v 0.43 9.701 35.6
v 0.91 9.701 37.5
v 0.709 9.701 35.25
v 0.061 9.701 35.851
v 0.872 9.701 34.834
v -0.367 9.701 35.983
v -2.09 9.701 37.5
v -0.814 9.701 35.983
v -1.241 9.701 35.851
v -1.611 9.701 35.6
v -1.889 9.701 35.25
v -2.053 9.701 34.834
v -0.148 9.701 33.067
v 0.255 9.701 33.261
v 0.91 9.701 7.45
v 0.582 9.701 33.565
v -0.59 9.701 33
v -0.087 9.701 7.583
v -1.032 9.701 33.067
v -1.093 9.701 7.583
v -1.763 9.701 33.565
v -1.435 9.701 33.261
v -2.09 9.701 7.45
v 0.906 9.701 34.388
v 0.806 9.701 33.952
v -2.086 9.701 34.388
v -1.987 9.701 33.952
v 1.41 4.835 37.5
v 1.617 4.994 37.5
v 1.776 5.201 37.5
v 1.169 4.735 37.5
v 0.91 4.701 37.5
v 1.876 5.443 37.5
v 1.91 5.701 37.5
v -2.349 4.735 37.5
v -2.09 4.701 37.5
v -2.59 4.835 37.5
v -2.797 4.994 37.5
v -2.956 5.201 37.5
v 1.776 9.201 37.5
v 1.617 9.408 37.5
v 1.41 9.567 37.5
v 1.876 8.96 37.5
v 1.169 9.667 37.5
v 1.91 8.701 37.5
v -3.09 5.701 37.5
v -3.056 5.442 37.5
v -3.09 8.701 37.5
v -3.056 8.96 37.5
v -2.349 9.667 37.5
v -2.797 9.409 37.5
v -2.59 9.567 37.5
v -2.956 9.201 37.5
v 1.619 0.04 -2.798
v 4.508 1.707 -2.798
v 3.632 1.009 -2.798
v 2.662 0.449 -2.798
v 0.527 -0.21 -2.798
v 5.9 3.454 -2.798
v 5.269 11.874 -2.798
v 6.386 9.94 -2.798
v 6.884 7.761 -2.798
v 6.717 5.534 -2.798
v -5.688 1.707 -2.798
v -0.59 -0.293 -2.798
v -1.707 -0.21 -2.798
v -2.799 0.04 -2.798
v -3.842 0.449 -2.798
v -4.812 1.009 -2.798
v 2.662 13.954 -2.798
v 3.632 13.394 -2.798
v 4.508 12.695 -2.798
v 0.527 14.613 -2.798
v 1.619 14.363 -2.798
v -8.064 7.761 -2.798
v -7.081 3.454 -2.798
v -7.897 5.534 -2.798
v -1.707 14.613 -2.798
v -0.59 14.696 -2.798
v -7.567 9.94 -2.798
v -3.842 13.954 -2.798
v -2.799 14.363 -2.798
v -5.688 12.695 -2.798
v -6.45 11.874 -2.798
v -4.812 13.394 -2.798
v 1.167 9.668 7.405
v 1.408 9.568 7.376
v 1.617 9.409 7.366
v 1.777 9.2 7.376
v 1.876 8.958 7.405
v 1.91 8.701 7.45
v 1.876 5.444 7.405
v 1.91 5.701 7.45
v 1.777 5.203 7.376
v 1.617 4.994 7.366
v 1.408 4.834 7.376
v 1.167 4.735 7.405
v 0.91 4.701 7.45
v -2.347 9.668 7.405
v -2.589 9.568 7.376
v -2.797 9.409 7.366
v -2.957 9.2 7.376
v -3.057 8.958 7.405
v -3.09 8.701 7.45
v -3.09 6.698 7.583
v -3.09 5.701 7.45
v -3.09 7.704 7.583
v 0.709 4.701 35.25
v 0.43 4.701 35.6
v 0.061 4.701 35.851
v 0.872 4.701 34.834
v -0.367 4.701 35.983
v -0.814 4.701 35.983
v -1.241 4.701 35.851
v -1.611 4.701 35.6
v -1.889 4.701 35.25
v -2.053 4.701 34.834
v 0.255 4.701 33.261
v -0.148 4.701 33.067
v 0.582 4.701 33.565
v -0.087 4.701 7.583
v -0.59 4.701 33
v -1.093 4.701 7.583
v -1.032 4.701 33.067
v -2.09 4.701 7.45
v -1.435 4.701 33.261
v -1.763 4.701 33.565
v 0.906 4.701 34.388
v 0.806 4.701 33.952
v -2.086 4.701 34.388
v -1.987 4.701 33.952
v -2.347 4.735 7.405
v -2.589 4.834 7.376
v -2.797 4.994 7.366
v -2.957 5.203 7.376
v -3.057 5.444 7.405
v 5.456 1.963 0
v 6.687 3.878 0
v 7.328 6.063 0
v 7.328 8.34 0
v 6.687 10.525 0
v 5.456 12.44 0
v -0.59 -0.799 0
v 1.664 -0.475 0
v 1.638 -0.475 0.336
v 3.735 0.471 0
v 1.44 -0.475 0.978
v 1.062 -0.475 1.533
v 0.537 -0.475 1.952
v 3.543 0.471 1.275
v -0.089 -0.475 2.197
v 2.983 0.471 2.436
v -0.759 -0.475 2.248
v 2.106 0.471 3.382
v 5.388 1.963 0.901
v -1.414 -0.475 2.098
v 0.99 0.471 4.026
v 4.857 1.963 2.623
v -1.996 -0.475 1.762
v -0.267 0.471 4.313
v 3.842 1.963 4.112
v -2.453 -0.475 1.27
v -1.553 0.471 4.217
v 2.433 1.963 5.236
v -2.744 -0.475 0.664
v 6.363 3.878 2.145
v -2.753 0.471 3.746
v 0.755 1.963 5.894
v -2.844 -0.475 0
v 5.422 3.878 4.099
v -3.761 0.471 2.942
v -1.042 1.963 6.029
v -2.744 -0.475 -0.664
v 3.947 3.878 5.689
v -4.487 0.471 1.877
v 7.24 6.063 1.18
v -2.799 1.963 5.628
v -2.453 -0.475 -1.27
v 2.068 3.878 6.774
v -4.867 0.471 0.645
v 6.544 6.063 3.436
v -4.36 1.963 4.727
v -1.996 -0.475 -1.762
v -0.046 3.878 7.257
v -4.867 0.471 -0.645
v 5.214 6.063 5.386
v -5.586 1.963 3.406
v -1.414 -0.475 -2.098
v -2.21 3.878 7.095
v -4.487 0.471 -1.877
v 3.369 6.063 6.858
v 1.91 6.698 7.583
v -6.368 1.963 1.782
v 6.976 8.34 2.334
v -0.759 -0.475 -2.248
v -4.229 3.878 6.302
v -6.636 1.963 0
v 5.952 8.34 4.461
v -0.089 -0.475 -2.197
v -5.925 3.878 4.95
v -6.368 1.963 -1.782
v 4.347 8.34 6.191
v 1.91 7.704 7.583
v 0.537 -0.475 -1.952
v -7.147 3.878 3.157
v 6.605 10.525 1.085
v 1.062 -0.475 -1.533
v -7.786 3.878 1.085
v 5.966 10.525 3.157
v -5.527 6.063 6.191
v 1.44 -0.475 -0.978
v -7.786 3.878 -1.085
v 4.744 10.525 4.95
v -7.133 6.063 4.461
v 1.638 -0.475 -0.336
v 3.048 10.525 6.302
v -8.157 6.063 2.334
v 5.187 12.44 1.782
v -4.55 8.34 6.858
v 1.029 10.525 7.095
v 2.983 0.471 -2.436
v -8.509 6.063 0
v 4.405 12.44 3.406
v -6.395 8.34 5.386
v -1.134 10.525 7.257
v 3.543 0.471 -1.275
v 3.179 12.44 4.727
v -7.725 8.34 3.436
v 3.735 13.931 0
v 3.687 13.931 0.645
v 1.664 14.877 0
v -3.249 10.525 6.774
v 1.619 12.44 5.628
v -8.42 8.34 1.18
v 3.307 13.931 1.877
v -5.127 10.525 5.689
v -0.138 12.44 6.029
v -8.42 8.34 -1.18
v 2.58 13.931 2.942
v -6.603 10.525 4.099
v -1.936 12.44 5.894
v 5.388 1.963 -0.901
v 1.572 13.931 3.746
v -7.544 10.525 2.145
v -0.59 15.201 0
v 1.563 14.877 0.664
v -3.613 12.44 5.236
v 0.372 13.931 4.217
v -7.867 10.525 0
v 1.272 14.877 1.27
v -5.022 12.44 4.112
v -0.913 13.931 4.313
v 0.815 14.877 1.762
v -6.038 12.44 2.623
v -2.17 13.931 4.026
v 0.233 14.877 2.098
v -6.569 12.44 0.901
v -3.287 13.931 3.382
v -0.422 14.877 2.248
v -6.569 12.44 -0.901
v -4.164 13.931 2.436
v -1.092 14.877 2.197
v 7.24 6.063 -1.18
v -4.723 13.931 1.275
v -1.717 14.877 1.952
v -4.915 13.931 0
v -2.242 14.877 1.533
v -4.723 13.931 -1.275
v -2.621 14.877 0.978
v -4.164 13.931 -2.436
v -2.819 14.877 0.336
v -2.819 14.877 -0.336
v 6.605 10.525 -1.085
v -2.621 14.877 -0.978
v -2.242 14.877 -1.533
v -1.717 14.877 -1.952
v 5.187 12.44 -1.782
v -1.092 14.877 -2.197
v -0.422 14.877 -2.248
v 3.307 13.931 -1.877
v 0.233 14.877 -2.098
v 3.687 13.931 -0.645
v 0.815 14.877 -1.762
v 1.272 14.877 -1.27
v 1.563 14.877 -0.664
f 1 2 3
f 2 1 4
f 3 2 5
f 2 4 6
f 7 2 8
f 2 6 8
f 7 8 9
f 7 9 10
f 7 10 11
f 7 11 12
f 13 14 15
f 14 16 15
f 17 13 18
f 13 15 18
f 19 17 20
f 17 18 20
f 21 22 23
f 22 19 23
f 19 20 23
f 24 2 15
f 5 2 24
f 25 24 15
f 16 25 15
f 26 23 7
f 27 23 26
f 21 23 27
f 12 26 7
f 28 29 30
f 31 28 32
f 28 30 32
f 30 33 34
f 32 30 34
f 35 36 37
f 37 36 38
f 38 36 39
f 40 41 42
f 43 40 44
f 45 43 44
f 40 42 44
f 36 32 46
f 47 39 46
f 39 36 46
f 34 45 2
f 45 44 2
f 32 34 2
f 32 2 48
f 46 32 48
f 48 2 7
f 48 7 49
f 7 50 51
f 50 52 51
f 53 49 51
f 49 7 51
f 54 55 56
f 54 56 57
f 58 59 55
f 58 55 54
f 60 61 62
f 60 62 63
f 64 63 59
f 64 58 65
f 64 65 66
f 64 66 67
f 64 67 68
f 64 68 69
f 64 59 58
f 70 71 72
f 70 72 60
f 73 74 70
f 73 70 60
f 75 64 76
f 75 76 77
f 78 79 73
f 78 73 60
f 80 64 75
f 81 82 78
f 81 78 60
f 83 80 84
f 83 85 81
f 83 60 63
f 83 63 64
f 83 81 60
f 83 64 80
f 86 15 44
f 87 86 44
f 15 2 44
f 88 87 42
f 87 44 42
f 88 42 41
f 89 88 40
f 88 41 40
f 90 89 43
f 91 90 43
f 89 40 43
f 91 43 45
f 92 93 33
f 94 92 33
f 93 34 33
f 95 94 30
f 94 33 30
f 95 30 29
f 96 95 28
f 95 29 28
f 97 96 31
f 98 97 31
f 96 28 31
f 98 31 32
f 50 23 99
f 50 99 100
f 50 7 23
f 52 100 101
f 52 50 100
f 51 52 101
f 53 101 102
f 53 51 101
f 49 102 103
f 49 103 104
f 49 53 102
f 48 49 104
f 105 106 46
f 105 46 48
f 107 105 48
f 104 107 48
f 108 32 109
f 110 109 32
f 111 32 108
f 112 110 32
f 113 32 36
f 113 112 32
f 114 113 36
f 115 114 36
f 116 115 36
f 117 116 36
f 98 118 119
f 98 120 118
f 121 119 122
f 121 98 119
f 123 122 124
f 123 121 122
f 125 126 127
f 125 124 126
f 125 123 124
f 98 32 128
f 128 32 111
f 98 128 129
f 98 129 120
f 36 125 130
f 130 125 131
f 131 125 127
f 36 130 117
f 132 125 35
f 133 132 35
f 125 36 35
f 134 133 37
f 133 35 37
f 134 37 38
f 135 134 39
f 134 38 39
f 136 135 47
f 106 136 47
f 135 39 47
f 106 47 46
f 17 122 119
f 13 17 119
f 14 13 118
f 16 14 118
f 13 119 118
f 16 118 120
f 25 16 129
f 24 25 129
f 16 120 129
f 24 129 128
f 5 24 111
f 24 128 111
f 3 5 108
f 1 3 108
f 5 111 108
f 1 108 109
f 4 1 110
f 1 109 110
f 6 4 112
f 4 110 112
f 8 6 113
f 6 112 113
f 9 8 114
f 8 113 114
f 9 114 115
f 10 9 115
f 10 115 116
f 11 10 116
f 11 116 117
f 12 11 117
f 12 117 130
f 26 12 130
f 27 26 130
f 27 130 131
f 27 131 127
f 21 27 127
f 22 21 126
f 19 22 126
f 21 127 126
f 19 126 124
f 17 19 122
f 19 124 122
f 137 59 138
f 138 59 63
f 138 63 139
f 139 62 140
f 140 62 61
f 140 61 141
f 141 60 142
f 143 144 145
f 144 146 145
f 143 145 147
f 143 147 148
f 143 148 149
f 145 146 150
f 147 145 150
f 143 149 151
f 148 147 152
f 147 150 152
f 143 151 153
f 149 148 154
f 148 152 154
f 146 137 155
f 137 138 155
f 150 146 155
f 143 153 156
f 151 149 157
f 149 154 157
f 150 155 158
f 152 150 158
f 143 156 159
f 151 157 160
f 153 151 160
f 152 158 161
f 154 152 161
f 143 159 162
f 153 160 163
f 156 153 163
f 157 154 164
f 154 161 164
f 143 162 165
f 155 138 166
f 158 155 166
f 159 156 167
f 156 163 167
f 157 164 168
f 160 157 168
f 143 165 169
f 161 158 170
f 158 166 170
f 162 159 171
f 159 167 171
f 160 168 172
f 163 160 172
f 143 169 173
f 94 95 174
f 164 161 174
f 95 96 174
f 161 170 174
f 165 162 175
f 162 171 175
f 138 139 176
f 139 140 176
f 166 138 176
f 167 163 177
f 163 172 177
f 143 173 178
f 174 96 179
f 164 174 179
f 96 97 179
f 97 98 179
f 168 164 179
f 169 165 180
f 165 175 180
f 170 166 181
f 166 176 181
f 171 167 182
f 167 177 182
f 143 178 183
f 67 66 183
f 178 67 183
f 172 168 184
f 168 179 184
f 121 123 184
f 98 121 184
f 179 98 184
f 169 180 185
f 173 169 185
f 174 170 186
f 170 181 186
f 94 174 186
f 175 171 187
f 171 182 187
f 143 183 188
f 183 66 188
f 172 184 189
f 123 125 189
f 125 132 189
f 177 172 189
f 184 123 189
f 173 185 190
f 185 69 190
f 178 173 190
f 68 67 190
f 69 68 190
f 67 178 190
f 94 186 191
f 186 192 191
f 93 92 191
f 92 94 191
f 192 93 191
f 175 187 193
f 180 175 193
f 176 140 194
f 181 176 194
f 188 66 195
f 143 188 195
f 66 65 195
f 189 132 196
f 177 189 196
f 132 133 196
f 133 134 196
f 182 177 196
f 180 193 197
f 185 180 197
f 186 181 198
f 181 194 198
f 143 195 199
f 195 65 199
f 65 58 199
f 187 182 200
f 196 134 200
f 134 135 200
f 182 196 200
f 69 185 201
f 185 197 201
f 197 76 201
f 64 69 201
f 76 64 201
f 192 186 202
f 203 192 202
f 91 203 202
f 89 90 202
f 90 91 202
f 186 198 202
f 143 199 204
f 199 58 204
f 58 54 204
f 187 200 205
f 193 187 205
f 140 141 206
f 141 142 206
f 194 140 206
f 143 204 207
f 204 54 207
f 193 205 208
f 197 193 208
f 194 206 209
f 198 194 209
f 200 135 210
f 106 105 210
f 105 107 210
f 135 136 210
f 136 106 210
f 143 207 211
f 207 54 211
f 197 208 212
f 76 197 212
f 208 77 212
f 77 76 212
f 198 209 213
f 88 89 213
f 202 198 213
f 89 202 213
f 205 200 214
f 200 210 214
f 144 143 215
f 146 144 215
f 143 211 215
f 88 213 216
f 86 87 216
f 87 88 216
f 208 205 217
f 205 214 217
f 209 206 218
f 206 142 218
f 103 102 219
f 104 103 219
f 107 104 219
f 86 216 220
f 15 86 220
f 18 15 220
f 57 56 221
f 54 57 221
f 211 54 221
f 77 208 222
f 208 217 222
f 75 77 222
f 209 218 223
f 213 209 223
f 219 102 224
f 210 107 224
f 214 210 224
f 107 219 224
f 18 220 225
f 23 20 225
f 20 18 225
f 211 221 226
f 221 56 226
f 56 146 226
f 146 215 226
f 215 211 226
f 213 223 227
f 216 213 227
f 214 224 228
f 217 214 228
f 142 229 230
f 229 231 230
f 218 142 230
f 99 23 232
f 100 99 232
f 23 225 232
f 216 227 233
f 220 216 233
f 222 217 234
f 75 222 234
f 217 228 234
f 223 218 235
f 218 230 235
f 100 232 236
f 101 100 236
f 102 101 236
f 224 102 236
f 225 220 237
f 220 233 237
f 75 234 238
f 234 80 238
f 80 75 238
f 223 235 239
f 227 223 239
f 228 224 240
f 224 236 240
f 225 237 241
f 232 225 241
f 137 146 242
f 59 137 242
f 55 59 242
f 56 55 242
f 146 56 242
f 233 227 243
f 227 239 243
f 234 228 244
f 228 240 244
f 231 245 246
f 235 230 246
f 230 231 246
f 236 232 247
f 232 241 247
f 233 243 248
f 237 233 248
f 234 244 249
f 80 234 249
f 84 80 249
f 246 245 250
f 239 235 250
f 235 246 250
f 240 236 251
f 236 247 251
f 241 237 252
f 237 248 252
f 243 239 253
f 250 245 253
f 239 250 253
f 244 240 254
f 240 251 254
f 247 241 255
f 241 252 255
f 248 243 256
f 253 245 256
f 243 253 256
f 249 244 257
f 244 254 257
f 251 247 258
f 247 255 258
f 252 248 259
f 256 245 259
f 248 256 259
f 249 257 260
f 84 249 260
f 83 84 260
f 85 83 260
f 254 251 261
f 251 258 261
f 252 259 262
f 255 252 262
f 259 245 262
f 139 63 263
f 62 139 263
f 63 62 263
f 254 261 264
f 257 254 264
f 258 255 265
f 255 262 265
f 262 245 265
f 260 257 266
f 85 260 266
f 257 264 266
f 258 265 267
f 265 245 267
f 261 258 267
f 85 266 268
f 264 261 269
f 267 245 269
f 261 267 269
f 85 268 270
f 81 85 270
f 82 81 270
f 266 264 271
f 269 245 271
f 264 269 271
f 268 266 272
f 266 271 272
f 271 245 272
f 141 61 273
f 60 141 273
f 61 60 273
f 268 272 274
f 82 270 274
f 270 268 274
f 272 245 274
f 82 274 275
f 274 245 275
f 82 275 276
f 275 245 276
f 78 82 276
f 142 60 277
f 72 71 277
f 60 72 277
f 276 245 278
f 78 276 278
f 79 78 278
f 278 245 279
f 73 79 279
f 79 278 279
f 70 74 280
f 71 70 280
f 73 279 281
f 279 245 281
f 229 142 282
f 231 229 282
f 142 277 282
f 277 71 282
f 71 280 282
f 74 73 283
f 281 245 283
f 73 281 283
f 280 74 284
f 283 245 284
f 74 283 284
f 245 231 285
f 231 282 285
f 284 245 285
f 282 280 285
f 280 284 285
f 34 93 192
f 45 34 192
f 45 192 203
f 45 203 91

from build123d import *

# Parameters (mm, degrees)
SKETCH3_W           = 5
SKETCH3_H           = 5
BOSS_EXTRUDE1_DEPTH = 37.5
SKETCH4_R           = 1.5
CUT_EXTRUDE1_DEPTH  = 5
SKETCH5_W           = 3.469365962
SKETCH5_H           = 1.189282553
BOSS_EXTRUDE2_DEPTH = 8
SKETCH6_W           = 20.090906928
SKETCH6_H           = 16.444349254
CUT_EXTRUDE2_DEPTH  = 10.5
FILLET5_R           = 1
FILLET6_R           = 1
FILLET7_R           = 1
FILLET8_R           = 1


with BuildPart() as part:
    # Sketch1 → Revolve1 (revolve)
    with BuildSketch(Plane.XY):
        with BuildLine():
            Line((-0.590277778, 15.201388889), (-0.590277778, -0.798611111))
            ThreePointArc((-0.590277778, -0.798611111), (7.409722222, 7.201388889), (-0.590277778, 15.201388889))
        make_face()
    revolve(axis=Axis((-0.590277778, 15.201388889, 0), (0, -1, 0)))

    # Sketch3 → Boss-Extrude1 (add)
    with BuildSketch(Plane(origin=(0, 0, 0), x_dir=(-1, 0, 0), z_dir=(0, 0, -1))):
        with Locations((0.590277778, 7.201388889)):
            Rectangle(SKETCH3_W, SKETCH3_H)
    extrude(amount=-BOSS_EXTRUDE1_DEPTH)

    # Sketch4 → Cut-Extrude1 (cut)
    with BuildSketch(Plane.XZ.offset(-4.701388889)):
        with Locations(Location((-0.590277778, 34.5, 0), (0, 0, 270))):
            Circle(SKETCH4_R)
    extrude(amount=-CUT_EXTRUDE1_DEPTH, mode=Mode.SUBTRACT)


with BuildPart() as body_2:
    # Sketch5 → Boss-Extrude2 (new body)
    with BuildSketch(Plane(origin=(0, 0, 0), x_dir=(1, 0, 0), z_dir=(0, 1, 0))):
        with Locations((0, 12.70312089)):
            Rectangle(SKETCH5_W, SKETCH5_H)
    extrude(amount=BOSS_EXTRUDE2_DEPTH)


with BuildPart() as cut_extrude2_tool:
    # Sketch6 → Cut-Extrude2 (new body)
    with BuildSketch(Plane(origin=(0, 0, -13.297762167), x_dir=(-1, 0, 0), z_dir=(0, 0, -1))):
        with Locations((0.125748138, 7.050416756)):
            Rectangle(SKETCH6_W, SKETCH6_H)
    extrude(amount=-CUT_EXTRUDE2_DEPTH)


with BuildPart() as part_1:
    add(part.part)

    # Cut-Extrude2: cut by cut_extrude2_tool
    add(cut_extrude2_tool.part, mode=Mode.SUBTRACT)

    # Fillet5
    fillet5_edges = [part_1.edges().sort_by_distance(p)[0] for p in [
        (-3.090277778, 9.701388889, 22.338175024),
    ]]
    fillet(fillet5_edges, radius=FILLET5_R - 0.0001)  # a hair under: the kernel refuses the full size

    # Fillet6
    fillet6_edges = [part_1.edges().sort_by_distance(p)[0] for p in [
        (1.909722222, 9.701388889, 22.338175024),
    ]]
    fillet(fillet6_edges, radius=FILLET6_R)

    # Fillet7
    fillet7_edges = [part_1.edges().sort_by_distance(p)[0] for p in [
        (1.909722222, 4.701388889, 22.338175024),
    ]]
    fillet(fillet7_edges, radius=FILLET7_R)

    # Fillet8
    fillet8_edges = [part_1.edges().sort_by_distance(p)[0] for p in [
        (-3.090277778, 4.701388889, 22.338175024),
    ]]
    fillet(fillet8_edges, radius=FILLET8_R - 0.0001)  # a hair under: the kernel refuses the full size


with BuildPart() as body_2_1:
    add(body_2.part)

    # Cut-Extrude2: cut by cut_extrude2_tool
    add(cut_extrude2_tool.part, mode=Mode.SUBTRACT)


solid = part_1.part
